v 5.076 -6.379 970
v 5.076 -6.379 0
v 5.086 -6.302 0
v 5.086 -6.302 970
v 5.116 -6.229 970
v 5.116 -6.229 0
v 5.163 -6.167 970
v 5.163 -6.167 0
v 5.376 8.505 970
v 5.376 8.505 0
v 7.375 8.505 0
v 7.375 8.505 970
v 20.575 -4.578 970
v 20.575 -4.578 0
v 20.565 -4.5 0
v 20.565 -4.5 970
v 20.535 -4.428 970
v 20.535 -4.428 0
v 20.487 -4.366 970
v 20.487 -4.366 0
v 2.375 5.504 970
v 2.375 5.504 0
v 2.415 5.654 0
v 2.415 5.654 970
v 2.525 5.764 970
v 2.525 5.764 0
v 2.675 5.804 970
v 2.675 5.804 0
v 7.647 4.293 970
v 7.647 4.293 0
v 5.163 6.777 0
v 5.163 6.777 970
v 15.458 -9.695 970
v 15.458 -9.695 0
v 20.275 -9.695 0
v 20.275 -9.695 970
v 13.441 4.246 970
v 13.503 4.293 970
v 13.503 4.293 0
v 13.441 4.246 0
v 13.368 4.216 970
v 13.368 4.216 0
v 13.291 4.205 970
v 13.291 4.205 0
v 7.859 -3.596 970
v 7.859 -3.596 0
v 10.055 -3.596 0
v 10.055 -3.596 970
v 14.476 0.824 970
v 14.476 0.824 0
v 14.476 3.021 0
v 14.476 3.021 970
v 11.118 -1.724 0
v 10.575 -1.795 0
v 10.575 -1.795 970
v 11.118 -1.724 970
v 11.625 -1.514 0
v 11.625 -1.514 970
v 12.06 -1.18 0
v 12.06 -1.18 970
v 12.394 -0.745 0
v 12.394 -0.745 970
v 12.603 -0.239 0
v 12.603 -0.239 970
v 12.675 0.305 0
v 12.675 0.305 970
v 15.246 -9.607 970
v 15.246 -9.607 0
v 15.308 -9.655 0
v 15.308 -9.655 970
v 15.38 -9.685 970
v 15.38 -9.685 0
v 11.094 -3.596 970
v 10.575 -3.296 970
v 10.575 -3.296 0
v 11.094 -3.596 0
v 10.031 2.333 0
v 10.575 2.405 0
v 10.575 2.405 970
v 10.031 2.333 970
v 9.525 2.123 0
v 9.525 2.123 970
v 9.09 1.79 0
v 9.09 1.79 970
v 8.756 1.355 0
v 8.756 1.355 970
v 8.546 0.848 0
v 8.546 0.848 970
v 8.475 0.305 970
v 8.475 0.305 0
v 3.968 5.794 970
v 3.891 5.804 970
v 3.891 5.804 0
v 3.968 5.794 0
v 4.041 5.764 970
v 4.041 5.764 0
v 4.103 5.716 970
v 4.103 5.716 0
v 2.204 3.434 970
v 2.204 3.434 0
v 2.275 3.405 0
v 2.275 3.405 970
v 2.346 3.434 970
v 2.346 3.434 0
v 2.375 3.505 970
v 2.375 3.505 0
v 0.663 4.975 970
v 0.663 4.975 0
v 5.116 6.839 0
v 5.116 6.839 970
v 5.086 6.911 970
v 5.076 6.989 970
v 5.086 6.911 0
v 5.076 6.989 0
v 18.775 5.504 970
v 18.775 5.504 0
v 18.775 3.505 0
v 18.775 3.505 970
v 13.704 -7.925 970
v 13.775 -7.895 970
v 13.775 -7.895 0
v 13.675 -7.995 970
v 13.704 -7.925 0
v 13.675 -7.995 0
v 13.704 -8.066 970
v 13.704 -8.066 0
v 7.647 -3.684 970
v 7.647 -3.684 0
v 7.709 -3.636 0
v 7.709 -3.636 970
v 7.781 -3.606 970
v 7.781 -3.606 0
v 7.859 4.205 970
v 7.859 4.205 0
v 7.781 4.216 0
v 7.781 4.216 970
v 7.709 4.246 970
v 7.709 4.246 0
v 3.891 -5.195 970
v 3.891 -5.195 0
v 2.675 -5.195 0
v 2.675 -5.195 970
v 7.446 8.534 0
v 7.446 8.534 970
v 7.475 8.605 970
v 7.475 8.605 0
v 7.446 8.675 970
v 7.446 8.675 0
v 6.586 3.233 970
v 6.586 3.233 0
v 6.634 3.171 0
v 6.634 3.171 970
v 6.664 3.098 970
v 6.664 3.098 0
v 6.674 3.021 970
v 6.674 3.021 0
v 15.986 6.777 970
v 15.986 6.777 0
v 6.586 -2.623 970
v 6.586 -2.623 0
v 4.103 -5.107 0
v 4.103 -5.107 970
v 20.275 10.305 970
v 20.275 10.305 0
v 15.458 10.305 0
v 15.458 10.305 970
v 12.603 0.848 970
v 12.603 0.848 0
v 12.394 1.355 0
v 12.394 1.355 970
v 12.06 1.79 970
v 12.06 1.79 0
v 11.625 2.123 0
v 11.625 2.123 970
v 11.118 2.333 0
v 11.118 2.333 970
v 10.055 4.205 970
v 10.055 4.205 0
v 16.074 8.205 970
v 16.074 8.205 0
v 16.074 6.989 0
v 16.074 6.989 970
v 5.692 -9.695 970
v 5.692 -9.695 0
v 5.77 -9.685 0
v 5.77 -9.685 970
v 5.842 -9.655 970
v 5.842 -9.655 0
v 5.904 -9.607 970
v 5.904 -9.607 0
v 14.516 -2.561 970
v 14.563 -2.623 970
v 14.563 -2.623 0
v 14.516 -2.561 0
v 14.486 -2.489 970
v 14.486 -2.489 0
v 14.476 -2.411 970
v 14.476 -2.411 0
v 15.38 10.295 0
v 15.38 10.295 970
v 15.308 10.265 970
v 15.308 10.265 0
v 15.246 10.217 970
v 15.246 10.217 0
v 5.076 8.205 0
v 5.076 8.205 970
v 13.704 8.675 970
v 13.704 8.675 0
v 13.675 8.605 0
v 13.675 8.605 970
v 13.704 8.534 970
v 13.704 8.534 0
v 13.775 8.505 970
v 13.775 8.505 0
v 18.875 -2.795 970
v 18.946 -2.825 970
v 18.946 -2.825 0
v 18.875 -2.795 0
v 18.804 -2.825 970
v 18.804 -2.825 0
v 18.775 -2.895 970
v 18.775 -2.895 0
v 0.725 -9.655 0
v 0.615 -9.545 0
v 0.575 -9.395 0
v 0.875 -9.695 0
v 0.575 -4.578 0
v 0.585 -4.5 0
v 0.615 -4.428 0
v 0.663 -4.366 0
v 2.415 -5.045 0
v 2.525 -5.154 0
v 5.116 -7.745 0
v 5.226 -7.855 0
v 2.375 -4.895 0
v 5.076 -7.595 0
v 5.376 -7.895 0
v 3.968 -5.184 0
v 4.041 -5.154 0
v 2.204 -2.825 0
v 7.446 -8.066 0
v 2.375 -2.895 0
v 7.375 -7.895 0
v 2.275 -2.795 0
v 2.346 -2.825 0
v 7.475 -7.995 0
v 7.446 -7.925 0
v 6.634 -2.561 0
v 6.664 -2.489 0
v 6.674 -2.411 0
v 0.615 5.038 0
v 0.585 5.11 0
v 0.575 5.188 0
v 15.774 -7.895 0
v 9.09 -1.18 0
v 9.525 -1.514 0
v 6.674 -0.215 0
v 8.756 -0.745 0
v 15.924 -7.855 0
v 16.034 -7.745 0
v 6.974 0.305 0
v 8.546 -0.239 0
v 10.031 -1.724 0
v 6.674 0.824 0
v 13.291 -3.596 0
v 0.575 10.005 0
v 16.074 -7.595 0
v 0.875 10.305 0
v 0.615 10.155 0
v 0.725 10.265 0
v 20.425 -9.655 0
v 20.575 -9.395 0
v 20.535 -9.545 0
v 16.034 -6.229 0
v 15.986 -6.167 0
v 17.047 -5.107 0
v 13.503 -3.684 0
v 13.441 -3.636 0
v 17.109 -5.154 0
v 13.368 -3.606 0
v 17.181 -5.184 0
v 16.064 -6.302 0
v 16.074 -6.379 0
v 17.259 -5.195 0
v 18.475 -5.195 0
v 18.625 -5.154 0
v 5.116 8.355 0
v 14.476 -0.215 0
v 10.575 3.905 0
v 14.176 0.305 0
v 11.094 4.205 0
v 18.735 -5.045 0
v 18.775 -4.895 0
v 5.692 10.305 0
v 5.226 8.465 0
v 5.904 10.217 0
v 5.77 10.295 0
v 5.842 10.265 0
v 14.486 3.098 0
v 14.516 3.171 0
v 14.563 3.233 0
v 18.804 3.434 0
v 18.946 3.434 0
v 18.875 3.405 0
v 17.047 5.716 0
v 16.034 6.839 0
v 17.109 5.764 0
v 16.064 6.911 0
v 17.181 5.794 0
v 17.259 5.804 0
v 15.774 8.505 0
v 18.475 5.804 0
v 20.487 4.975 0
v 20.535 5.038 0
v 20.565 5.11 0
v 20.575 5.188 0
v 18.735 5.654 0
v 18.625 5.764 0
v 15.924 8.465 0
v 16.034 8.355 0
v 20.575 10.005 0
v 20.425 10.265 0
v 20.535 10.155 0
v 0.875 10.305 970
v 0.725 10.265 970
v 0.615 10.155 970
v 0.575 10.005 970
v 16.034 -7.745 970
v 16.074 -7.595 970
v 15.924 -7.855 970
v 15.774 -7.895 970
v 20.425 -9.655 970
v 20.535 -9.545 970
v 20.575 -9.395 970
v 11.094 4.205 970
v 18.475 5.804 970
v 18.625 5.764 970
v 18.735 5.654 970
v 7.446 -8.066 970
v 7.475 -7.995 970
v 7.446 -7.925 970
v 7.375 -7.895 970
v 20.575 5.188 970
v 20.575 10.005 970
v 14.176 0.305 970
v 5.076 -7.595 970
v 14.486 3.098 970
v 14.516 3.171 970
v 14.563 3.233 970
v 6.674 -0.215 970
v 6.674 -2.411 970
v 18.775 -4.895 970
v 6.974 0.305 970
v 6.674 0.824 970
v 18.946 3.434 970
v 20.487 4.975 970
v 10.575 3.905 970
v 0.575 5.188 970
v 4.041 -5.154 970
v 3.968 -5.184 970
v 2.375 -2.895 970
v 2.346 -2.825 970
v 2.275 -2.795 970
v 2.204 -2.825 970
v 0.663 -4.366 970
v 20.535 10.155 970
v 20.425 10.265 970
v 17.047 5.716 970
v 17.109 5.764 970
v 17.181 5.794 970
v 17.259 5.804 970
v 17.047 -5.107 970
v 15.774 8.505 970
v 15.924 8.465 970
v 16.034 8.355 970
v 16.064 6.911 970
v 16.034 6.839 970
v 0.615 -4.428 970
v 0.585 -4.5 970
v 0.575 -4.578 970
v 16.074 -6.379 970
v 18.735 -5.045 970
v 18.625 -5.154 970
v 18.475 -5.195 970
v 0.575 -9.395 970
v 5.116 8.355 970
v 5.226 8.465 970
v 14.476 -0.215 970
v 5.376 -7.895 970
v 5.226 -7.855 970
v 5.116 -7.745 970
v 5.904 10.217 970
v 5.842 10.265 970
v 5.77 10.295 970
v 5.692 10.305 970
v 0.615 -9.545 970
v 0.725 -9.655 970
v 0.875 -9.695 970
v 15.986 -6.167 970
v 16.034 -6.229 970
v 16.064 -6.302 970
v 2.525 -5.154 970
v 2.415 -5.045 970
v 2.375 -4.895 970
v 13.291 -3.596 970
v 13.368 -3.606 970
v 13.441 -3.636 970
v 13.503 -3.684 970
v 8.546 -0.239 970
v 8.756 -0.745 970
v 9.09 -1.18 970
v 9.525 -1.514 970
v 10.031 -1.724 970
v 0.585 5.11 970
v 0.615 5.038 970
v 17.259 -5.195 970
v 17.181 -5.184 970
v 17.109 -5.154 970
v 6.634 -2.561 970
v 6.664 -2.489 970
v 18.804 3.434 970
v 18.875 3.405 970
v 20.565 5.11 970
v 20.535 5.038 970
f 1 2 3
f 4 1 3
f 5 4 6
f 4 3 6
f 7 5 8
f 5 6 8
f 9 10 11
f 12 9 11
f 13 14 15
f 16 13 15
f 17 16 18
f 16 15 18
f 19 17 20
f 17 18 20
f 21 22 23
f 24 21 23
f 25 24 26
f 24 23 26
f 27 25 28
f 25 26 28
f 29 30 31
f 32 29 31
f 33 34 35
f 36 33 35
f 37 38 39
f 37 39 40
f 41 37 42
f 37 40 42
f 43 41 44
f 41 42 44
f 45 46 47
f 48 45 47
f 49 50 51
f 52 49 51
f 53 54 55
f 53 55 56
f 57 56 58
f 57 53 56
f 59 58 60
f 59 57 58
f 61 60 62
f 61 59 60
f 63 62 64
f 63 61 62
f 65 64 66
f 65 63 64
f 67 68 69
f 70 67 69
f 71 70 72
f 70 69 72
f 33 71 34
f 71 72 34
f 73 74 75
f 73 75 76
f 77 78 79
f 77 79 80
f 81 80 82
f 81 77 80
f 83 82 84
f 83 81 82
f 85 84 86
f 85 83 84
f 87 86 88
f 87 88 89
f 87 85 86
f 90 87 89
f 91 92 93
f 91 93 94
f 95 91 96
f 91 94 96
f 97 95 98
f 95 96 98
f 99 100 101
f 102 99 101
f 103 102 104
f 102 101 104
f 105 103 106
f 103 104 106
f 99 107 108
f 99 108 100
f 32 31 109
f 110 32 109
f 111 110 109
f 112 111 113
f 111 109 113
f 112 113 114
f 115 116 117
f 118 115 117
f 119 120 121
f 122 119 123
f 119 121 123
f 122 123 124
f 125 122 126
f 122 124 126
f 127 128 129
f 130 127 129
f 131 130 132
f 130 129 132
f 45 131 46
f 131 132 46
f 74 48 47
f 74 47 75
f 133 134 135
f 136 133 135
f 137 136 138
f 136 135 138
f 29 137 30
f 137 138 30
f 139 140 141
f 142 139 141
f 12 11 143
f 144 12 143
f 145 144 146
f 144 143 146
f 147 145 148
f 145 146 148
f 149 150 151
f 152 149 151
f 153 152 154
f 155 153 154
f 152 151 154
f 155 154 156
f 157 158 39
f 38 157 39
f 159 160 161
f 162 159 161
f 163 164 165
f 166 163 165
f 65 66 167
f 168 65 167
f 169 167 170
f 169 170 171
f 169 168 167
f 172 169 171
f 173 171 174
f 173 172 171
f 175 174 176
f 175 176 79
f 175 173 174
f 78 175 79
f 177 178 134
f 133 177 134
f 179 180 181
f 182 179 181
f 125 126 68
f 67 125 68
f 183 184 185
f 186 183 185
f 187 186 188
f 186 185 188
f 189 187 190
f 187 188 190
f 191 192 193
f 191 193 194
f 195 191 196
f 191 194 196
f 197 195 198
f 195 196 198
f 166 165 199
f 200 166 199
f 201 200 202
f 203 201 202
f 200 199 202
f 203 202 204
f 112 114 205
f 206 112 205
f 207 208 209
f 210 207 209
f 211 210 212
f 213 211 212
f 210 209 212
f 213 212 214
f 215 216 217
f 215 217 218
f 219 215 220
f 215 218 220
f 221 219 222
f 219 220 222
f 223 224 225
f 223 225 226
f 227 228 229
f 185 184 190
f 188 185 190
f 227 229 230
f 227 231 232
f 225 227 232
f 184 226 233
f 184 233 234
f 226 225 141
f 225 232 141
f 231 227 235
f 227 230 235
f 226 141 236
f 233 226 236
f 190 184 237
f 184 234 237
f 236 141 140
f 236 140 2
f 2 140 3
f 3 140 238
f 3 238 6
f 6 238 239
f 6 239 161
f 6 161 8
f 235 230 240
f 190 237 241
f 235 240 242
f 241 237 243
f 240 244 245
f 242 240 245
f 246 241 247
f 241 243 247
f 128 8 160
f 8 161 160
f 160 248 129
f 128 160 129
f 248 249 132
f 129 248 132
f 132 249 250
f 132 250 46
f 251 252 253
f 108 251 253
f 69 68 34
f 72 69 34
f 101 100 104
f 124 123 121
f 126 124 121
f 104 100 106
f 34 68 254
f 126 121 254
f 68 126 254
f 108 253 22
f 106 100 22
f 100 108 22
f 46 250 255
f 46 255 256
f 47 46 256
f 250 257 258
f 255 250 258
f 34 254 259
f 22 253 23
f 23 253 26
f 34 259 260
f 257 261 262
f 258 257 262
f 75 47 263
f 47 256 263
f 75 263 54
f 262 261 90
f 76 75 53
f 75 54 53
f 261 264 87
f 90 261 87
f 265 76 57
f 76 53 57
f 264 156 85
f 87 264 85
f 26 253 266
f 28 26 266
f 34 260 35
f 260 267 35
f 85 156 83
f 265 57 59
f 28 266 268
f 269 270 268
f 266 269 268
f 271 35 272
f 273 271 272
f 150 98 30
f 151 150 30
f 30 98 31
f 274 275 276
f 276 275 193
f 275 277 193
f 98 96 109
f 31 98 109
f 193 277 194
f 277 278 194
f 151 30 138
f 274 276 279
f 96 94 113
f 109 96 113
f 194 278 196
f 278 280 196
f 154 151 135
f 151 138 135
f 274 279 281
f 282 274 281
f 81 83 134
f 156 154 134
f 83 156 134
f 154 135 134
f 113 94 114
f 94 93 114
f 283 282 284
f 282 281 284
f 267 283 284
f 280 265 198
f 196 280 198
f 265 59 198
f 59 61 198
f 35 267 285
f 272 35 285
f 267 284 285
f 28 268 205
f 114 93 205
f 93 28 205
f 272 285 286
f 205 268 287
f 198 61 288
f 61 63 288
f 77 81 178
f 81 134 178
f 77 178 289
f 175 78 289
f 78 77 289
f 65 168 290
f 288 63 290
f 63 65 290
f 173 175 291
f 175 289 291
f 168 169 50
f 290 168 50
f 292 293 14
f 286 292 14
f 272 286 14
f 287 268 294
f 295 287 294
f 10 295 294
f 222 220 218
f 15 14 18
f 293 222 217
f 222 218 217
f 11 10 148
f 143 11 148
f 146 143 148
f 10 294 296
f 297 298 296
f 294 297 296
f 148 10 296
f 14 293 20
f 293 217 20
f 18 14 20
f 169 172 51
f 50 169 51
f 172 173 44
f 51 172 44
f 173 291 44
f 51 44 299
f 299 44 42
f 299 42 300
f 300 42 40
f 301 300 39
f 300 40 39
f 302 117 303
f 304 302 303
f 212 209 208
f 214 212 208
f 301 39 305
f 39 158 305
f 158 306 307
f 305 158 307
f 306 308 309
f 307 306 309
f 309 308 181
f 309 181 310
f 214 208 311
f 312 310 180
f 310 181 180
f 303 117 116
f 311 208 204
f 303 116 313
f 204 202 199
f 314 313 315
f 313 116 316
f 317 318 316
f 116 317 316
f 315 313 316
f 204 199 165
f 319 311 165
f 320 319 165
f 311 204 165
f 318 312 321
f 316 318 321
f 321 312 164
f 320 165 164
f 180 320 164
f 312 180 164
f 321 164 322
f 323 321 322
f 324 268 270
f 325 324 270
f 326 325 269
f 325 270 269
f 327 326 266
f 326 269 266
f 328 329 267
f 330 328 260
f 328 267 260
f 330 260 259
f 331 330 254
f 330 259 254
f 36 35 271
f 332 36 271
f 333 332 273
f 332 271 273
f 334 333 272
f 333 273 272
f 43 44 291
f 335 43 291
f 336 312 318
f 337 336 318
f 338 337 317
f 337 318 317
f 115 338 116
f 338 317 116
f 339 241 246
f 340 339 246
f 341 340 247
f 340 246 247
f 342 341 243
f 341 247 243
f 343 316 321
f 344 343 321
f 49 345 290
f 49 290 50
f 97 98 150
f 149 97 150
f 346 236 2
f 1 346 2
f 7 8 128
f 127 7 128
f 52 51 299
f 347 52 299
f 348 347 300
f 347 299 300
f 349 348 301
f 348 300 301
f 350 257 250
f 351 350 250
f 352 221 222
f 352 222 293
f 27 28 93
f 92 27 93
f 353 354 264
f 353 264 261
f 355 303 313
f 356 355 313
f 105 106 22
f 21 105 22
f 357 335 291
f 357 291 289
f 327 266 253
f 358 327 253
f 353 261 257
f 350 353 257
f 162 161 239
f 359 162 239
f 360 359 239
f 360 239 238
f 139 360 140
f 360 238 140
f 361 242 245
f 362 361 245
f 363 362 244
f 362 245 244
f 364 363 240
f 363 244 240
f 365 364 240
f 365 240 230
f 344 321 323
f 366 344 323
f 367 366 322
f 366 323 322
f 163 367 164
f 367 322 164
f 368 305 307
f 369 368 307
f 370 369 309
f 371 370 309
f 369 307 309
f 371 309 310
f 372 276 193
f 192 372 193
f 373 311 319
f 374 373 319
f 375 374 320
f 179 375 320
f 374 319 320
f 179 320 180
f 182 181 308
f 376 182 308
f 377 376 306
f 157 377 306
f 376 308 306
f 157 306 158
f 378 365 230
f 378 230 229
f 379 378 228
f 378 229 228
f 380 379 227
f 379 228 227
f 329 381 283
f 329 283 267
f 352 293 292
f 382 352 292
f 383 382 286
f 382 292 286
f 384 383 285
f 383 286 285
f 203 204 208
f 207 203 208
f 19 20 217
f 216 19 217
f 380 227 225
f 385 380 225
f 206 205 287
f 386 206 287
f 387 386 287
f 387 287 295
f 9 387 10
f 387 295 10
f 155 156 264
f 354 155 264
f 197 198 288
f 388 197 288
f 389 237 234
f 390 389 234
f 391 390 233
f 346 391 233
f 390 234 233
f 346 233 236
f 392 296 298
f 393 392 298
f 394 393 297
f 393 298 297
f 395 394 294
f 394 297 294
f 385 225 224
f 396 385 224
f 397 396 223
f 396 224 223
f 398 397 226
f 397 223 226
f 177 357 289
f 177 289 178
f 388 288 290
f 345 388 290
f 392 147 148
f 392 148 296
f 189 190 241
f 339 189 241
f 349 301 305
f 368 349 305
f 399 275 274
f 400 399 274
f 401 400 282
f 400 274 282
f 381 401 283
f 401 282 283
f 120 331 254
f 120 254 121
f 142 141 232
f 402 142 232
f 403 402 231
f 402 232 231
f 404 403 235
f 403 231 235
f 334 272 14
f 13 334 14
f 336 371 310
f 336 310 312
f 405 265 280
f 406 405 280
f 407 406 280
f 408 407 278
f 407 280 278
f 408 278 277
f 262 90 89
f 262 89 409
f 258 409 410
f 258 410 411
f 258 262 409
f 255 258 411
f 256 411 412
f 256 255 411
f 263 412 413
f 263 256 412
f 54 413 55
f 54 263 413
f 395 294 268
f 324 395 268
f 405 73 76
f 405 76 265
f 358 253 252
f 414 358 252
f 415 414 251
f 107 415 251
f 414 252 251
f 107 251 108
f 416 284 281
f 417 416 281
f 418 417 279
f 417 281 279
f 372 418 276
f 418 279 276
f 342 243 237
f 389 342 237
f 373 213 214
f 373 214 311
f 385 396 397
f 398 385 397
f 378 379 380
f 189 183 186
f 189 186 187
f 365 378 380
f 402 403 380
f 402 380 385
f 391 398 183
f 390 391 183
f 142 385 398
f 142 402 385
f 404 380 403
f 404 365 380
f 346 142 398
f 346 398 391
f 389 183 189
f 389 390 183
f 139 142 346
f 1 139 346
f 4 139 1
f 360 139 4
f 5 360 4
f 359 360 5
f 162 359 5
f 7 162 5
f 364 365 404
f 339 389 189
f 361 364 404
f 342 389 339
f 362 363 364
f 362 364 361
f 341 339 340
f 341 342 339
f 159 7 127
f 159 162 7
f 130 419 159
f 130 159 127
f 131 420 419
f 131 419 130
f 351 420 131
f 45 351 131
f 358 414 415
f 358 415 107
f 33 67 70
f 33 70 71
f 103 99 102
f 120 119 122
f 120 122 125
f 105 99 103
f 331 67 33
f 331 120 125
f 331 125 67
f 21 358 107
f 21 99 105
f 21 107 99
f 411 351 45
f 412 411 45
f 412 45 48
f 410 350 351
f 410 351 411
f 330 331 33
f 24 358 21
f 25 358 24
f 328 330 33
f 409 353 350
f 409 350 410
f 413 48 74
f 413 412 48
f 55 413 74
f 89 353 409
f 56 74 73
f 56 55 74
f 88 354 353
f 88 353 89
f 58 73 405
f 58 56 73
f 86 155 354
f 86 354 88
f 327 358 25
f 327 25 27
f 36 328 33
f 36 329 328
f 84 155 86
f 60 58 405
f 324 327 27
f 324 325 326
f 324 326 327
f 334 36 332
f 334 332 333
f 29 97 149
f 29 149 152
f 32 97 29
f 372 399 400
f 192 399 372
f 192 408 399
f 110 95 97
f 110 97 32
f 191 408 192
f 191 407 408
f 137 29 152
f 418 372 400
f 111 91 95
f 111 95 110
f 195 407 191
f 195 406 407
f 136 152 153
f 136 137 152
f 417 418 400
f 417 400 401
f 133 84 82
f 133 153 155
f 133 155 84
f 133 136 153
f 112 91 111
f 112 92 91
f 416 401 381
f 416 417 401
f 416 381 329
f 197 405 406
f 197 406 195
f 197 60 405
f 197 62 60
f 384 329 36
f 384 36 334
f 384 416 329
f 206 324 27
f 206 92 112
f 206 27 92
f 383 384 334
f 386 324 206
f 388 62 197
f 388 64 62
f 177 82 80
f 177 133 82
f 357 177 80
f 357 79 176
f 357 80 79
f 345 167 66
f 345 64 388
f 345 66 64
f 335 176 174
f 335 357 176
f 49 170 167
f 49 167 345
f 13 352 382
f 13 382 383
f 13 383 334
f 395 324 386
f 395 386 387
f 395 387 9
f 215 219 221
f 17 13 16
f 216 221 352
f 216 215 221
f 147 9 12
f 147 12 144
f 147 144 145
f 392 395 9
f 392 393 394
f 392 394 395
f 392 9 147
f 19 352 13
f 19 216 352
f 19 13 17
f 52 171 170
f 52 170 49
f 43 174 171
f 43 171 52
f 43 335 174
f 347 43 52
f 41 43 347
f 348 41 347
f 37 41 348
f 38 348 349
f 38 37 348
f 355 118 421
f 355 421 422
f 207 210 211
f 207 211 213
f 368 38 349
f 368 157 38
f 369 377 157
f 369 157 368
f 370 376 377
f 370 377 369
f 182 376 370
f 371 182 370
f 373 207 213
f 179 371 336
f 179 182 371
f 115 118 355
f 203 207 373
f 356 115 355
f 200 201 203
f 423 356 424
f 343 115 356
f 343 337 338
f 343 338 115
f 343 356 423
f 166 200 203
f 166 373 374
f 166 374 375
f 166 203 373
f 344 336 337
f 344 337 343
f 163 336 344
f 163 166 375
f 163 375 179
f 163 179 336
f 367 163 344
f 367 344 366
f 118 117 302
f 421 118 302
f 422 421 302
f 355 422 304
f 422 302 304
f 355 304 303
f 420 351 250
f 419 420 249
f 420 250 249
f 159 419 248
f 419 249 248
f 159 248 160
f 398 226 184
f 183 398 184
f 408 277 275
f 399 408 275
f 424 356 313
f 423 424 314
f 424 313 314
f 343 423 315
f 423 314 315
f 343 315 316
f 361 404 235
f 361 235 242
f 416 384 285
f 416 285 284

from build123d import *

# Parameters (mm, degrees)
BOSS_EXTRU_1_DEPTH = 970


with BuildPart() as part:
    # Esquisse1 → Boss.-Extru.1 (new body)
    with BuildSketch(Plane.XY):
        with BuildLine():
            Line((18.774857412, -2.895228684), (18.774857412, -4.894568513))
            ThreePointArc((18.774857412, -4.894568513), (18.686989447, -5.106700547), (18.474857412, -5.194568513))
            Line((18.474857412, -5.194568513), (17.259121481, -5.194568513))
            ThreePointArc((17.259121481, -5.194568513), (17.144316451, -5.171732372), (17.046989447, -5.106700547))
            Line((17.046989447, -5.106700547), (14.56338555, -2.62309665))
            ThreePointArc((14.56338555, -2.62309665), (14.498353724, -2.525769645), (14.475517584, -2.410964616))
            Line((14.475517584, -2.410964616), (14.475517584, -0.214843927))
            Line((14.475517584, -0.214843927), (14.175517584, 0.304771316))
            Line((14.175517584, 0.304771316), (14.475517584, 0.824386558))
            Line((14.475517584, 0.824386558), (14.475517584, 3.020507247))
            ThreePointArc((14.475517584, 3.020507247), (14.498353724, 3.135312277), (14.56338555, 3.232639281))
            Line((14.56338555, 3.232639281), (17.046989447, 5.716243178))
            ThreePointArc((17.046989447, 5.716243178), (17.144316451, 5.781275004), (17.259121481, 5.804111144))
            Line((17.259121481, 5.804111144), (18.474857412, 5.804111144))
            ThreePointArc((18.474857412, 5.804111144), (18.686989447, 5.716243178), (18.774857412, 5.504111144))
            Line((18.774857412, 5.504111144), (18.774857412, 3.504771316))
            ThreePointArc((18.774857412, 3.504771316), (18.836589069, 3.412383362), (18.94556809, 3.434060638))
            Line((18.94556809, 3.434060638), (20.486989447, 4.975481994))
            ThreePointArc((20.486989447, 4.975481994), (20.552021272, 5.072808998), (20.574857412, 5.187614028))
            Line((20.574857412, 5.187614028), (20.574857412, 10.004771316))
            ThreePointArc((20.574857412, 10.004771316), (20.486989447, 10.21690335), (20.274857412, 10.304771316))
            Line((20.274857412, 10.304771316), (15.457700125, 10.304771316))
            ThreePointArc((15.457700125, 10.304771316), (15.342895095, 10.281935175), (15.24556809, 10.21690335))
            Line((15.24556809, 10.21690335), (13.704146734, 8.675481994))
            ThreePointArc((13.704146734, 8.675481994), (13.682469459, 8.566502972), (13.774857412, 8.504771316))
            Line((13.774857412, 8.504771316), (15.77419724, 8.504771316))
            ThreePointArc((15.77419724, 8.504771316), (15.986329275, 8.41690335), (16.07419724, 8.204771316))
            Line((16.07419724, 8.204771316), (16.07419724, 6.989035384))
            ThreePointArc((16.07419724, 6.989035384), (16.0513611, 6.874230355), (15.986329275, 6.77690335))
            Line((15.986329275, 6.77690335), (13.502725378, 4.293299453))
            ThreePointArc((13.502725378, 4.293299453), (13.405398373, 4.228267628), (13.290593344, 4.205431487))
            Line((13.290593344, 4.205431487), (11.094472654, 4.205431487))
            Line((11.094472654, 4.205431487), (10.574857412, 3.905431487))
            Line((10.574857412, 3.905431487), (10.05524217, 4.205431487))
            Line((10.05524217, 4.205431487), (7.859121481, 4.205431487))
            ThreePointArc((7.859121481, 4.205431487), (7.744316451, 4.228267628), (7.646989447, 4.293299453))
            Line((7.646989447, 4.293299453), (5.16338555, 6.77690335))
            ThreePointArc((5.16338555, 6.77690335), (5.098353724, 6.874230355), (5.075517584, 6.989035384))
            Line((5.075517584, 6.989035384), (5.075517584, 8.204771316))
            ThreePointArc((5.075517584, 8.204771316), (5.16338555, 8.41690335), (5.375517584, 8.504771316))
            Line((5.375517584, 8.504771316), (7.374857412, 8.504771316))
            ThreePointArc((7.374857412, 8.504771316), (7.467245365, 8.566502972), (7.44556809, 8.675481994))
            Line((7.44556809, 8.675481994), (5.904146734, 10.21690335))
            ThreePointArc((5.904146734, 10.21690335), (5.806819729, 10.281935175), (5.6920147, 10.304771316))
            Line((5.6920147, 10.304771316), (0.874857412, 10.304771316))
            ThreePointArc((0.874857412, 10.304771316), (0.662725378, 10.21690335), (0.574857412, 10.004771316))
            Line((0.574857412, 10.004771316), (0.574857412, 5.187614028))
            ThreePointArc((0.574857412, 5.187614028), (0.597693552, 5.072808998), (0.662725378, 4.975481994))
            Line((0.662725378, 4.975481994), (2.204146734, 3.434060638))
            ThreePointArc((2.204146734, 3.434060638), (2.313125755, 3.412383362), (2.374857412, 3.504771316))
            Line((2.374857412, 3.504771316), (2.374857412, 5.504111144))
            ThreePointArc((2.374857412, 5.504111144), (2.462725378, 5.716243178), (2.674857412, 5.804111144))
            Line((2.674857412, 5.804111144), (3.890593344, 5.804111144))
            ThreePointArc((3.890593344, 5.804111144), (4.005398373, 5.781275004), (4.102725378, 5.716243178))
            Line((4.102725378, 5.716243178), (6.586329275, 3.232639281))
            ThreePointArc((6.586329275, 3.232639281), (6.6513611, 3.135312277), (6.67419724, 3.020507247))
            Line((6.67419724, 3.020507247), (6.67419724, 0.824386558))
            Line((6.67419724, 0.824386558), (6.97419724, 0.304771316))
            Line((6.97419724, 0.304771316), (6.67419724, -0.214843927))
            Line((6.67419724, -0.214843927), (6.67419724, -2.410964616))
            ThreePointArc((6.67419724, -2.410964616), (6.6513611, -2.525769645), (6.586329275, -2.62309665))
            Line((6.586329275, -2.62309665), (4.102725378, -5.106700547))
            ThreePointArc((4.102725378, -5.106700547), (4.005398373, -5.171732372), (3.890593344, -5.194568513))
            Line((3.890593344, -5.194568513), (2.674857412, -5.194568513))
            ThreePointArc((2.674857412, -5.194568513), (2.462725378, -5.106700547), (2.374857412, -4.894568513))
            Line((2.374857412, -4.894568513), (2.374857412, -2.895228684))
            ThreePointArc((2.374857412, -2.895228684), (2.313125755, -2.802840731), (2.204146734, -2.824518006))
            Line((2.204146734, -2.824518006), (0.662725378, -4.365939362))
            ThreePointArc((0.662725378, -4.365939362), (0.597693552, -4.463266367), (0.574857412, -4.578071397))
            Line((0.574857412, -4.578071397), (0.574857412, -9.395228684))
            ThreePointArc((0.574857412, -9.395228684), (0.662725378, -9.607360719), (0.874857412, -9.695228684))
            Line((0.874857412, -9.695228684), (5.6920147, -9.695228684))
            ThreePointArc((5.6920147, -9.695228684), (5.806819729, -9.672392544), (5.904146734, -9.607360719))
            Line((5.904146734, -9.607360719), (7.44556809, -8.065939362))
            ThreePointArc((7.44556809, -8.065939362), (7.467245365, -7.956960341), (7.374857412, -7.895228684))
            Line((7.374857412, -7.895228684), (5.375517584, -7.895228684))
            ThreePointArc((5.375517584, -7.895228684), (5.16338555, -7.807360719), (5.075517584, -7.595228684))
            Line((5.075517584, -7.595228684), (5.075517584, -6.379492753))
            ThreePointArc((5.075517584, -6.379492753), (5.098353724, -6.264687723), (5.16338555, -6.167360719))
            Line((5.16338555, -6.167360719), (7.646989447, -3.683756822))
            ThreePointArc((7.646989447, -3.683756822), (7.744316451, -3.618724996), (7.859121481, -3.595888856))
            Line((7.859121481, -3.595888856), (10.05524217, -3.595888856))
            Line((10.05524217, -3.595888856), (10.574857412, -3.295888856))
            Line((10.574857412, -3.295888856), (11.094472654, -3.595888856))
            Line((11.094472654, -3.595888856), (13.290593344, -3.595888856))
            ThreePointArc((13.290593344, -3.595888856), (13.405398373, -3.618724996), (13.502725378, -3.683756822))
            Line((13.502725378, -3.683756822), (15.986329275, -6.167360719))
            ThreePointArc((15.986329275, -6.167360719), (16.0513611, -6.264687723), (16.07419724, -6.379492753))
            Line((16.07419724, -6.379492753), (16.07419724, -7.595228684))
            ThreePointArc((16.07419724, -7.595228684), (15.986329275, -7.807360719), (15.77419724, -7.895228684))
            Line((15.77419724, -7.895228684), (13.774857412, -7.895228684))
            ThreePointArc((13.774857412, -7.895228684), (13.682469459, -7.956960341), (13.704146734, -8.065939362))
            Line((13.704146734, -8.065939362), (15.24556809, -9.607360719))
            ThreePointArc((15.24556809, -9.607360719), (15.342895095, -9.672392544), (15.457700125, -9.695228684))
            Line((15.457700125, -9.695228684), (20.274857412, -9.695228684))
            ThreePointArc((20.274857412, -9.695228684), (20.486989447, -9.607360719), (20.574857412, -9.395228684))
            Line((20.574857412, -9.395228684), (20.574857412, -4.578071397))
            ThreePointArc((20.574857412, -4.578071397), (20.552021272, -4.463266367), (20.486989447, -4.365939362))
            Line((20.486989447, -4.365939362), (18.94556809, -2.824518006))
            ThreePointArc((18.94556809, -2.824518006), (18.836589069, -2.802840731), (18.774857412, -2.895228684))
        make_face()
        with BuildLine():
            ThreePointArc((10.574857412, -1.795228684), (12.059781653, -1.180152925), (12.674857412, 0.304771316))
            ThreePointArc((12.674857412, 0.304771316), (12.059781653, 1.789695556), (10.574857412, 2.404771316))
            ThreePointArc((10.574857412, 2.404771316), (9.089933172, 1.789695556), (8.474857412, 0.304771316))
            ThreePointArc((8.474857412, 0.304771316), (9.089933172, -1.180152925), (10.574857412, -1.795228684))
        make_face(mode=Mode.SUBTRACT)
    extrude(amount=BOSS_EXTRU_1_DEPTH)


solid = part.part
